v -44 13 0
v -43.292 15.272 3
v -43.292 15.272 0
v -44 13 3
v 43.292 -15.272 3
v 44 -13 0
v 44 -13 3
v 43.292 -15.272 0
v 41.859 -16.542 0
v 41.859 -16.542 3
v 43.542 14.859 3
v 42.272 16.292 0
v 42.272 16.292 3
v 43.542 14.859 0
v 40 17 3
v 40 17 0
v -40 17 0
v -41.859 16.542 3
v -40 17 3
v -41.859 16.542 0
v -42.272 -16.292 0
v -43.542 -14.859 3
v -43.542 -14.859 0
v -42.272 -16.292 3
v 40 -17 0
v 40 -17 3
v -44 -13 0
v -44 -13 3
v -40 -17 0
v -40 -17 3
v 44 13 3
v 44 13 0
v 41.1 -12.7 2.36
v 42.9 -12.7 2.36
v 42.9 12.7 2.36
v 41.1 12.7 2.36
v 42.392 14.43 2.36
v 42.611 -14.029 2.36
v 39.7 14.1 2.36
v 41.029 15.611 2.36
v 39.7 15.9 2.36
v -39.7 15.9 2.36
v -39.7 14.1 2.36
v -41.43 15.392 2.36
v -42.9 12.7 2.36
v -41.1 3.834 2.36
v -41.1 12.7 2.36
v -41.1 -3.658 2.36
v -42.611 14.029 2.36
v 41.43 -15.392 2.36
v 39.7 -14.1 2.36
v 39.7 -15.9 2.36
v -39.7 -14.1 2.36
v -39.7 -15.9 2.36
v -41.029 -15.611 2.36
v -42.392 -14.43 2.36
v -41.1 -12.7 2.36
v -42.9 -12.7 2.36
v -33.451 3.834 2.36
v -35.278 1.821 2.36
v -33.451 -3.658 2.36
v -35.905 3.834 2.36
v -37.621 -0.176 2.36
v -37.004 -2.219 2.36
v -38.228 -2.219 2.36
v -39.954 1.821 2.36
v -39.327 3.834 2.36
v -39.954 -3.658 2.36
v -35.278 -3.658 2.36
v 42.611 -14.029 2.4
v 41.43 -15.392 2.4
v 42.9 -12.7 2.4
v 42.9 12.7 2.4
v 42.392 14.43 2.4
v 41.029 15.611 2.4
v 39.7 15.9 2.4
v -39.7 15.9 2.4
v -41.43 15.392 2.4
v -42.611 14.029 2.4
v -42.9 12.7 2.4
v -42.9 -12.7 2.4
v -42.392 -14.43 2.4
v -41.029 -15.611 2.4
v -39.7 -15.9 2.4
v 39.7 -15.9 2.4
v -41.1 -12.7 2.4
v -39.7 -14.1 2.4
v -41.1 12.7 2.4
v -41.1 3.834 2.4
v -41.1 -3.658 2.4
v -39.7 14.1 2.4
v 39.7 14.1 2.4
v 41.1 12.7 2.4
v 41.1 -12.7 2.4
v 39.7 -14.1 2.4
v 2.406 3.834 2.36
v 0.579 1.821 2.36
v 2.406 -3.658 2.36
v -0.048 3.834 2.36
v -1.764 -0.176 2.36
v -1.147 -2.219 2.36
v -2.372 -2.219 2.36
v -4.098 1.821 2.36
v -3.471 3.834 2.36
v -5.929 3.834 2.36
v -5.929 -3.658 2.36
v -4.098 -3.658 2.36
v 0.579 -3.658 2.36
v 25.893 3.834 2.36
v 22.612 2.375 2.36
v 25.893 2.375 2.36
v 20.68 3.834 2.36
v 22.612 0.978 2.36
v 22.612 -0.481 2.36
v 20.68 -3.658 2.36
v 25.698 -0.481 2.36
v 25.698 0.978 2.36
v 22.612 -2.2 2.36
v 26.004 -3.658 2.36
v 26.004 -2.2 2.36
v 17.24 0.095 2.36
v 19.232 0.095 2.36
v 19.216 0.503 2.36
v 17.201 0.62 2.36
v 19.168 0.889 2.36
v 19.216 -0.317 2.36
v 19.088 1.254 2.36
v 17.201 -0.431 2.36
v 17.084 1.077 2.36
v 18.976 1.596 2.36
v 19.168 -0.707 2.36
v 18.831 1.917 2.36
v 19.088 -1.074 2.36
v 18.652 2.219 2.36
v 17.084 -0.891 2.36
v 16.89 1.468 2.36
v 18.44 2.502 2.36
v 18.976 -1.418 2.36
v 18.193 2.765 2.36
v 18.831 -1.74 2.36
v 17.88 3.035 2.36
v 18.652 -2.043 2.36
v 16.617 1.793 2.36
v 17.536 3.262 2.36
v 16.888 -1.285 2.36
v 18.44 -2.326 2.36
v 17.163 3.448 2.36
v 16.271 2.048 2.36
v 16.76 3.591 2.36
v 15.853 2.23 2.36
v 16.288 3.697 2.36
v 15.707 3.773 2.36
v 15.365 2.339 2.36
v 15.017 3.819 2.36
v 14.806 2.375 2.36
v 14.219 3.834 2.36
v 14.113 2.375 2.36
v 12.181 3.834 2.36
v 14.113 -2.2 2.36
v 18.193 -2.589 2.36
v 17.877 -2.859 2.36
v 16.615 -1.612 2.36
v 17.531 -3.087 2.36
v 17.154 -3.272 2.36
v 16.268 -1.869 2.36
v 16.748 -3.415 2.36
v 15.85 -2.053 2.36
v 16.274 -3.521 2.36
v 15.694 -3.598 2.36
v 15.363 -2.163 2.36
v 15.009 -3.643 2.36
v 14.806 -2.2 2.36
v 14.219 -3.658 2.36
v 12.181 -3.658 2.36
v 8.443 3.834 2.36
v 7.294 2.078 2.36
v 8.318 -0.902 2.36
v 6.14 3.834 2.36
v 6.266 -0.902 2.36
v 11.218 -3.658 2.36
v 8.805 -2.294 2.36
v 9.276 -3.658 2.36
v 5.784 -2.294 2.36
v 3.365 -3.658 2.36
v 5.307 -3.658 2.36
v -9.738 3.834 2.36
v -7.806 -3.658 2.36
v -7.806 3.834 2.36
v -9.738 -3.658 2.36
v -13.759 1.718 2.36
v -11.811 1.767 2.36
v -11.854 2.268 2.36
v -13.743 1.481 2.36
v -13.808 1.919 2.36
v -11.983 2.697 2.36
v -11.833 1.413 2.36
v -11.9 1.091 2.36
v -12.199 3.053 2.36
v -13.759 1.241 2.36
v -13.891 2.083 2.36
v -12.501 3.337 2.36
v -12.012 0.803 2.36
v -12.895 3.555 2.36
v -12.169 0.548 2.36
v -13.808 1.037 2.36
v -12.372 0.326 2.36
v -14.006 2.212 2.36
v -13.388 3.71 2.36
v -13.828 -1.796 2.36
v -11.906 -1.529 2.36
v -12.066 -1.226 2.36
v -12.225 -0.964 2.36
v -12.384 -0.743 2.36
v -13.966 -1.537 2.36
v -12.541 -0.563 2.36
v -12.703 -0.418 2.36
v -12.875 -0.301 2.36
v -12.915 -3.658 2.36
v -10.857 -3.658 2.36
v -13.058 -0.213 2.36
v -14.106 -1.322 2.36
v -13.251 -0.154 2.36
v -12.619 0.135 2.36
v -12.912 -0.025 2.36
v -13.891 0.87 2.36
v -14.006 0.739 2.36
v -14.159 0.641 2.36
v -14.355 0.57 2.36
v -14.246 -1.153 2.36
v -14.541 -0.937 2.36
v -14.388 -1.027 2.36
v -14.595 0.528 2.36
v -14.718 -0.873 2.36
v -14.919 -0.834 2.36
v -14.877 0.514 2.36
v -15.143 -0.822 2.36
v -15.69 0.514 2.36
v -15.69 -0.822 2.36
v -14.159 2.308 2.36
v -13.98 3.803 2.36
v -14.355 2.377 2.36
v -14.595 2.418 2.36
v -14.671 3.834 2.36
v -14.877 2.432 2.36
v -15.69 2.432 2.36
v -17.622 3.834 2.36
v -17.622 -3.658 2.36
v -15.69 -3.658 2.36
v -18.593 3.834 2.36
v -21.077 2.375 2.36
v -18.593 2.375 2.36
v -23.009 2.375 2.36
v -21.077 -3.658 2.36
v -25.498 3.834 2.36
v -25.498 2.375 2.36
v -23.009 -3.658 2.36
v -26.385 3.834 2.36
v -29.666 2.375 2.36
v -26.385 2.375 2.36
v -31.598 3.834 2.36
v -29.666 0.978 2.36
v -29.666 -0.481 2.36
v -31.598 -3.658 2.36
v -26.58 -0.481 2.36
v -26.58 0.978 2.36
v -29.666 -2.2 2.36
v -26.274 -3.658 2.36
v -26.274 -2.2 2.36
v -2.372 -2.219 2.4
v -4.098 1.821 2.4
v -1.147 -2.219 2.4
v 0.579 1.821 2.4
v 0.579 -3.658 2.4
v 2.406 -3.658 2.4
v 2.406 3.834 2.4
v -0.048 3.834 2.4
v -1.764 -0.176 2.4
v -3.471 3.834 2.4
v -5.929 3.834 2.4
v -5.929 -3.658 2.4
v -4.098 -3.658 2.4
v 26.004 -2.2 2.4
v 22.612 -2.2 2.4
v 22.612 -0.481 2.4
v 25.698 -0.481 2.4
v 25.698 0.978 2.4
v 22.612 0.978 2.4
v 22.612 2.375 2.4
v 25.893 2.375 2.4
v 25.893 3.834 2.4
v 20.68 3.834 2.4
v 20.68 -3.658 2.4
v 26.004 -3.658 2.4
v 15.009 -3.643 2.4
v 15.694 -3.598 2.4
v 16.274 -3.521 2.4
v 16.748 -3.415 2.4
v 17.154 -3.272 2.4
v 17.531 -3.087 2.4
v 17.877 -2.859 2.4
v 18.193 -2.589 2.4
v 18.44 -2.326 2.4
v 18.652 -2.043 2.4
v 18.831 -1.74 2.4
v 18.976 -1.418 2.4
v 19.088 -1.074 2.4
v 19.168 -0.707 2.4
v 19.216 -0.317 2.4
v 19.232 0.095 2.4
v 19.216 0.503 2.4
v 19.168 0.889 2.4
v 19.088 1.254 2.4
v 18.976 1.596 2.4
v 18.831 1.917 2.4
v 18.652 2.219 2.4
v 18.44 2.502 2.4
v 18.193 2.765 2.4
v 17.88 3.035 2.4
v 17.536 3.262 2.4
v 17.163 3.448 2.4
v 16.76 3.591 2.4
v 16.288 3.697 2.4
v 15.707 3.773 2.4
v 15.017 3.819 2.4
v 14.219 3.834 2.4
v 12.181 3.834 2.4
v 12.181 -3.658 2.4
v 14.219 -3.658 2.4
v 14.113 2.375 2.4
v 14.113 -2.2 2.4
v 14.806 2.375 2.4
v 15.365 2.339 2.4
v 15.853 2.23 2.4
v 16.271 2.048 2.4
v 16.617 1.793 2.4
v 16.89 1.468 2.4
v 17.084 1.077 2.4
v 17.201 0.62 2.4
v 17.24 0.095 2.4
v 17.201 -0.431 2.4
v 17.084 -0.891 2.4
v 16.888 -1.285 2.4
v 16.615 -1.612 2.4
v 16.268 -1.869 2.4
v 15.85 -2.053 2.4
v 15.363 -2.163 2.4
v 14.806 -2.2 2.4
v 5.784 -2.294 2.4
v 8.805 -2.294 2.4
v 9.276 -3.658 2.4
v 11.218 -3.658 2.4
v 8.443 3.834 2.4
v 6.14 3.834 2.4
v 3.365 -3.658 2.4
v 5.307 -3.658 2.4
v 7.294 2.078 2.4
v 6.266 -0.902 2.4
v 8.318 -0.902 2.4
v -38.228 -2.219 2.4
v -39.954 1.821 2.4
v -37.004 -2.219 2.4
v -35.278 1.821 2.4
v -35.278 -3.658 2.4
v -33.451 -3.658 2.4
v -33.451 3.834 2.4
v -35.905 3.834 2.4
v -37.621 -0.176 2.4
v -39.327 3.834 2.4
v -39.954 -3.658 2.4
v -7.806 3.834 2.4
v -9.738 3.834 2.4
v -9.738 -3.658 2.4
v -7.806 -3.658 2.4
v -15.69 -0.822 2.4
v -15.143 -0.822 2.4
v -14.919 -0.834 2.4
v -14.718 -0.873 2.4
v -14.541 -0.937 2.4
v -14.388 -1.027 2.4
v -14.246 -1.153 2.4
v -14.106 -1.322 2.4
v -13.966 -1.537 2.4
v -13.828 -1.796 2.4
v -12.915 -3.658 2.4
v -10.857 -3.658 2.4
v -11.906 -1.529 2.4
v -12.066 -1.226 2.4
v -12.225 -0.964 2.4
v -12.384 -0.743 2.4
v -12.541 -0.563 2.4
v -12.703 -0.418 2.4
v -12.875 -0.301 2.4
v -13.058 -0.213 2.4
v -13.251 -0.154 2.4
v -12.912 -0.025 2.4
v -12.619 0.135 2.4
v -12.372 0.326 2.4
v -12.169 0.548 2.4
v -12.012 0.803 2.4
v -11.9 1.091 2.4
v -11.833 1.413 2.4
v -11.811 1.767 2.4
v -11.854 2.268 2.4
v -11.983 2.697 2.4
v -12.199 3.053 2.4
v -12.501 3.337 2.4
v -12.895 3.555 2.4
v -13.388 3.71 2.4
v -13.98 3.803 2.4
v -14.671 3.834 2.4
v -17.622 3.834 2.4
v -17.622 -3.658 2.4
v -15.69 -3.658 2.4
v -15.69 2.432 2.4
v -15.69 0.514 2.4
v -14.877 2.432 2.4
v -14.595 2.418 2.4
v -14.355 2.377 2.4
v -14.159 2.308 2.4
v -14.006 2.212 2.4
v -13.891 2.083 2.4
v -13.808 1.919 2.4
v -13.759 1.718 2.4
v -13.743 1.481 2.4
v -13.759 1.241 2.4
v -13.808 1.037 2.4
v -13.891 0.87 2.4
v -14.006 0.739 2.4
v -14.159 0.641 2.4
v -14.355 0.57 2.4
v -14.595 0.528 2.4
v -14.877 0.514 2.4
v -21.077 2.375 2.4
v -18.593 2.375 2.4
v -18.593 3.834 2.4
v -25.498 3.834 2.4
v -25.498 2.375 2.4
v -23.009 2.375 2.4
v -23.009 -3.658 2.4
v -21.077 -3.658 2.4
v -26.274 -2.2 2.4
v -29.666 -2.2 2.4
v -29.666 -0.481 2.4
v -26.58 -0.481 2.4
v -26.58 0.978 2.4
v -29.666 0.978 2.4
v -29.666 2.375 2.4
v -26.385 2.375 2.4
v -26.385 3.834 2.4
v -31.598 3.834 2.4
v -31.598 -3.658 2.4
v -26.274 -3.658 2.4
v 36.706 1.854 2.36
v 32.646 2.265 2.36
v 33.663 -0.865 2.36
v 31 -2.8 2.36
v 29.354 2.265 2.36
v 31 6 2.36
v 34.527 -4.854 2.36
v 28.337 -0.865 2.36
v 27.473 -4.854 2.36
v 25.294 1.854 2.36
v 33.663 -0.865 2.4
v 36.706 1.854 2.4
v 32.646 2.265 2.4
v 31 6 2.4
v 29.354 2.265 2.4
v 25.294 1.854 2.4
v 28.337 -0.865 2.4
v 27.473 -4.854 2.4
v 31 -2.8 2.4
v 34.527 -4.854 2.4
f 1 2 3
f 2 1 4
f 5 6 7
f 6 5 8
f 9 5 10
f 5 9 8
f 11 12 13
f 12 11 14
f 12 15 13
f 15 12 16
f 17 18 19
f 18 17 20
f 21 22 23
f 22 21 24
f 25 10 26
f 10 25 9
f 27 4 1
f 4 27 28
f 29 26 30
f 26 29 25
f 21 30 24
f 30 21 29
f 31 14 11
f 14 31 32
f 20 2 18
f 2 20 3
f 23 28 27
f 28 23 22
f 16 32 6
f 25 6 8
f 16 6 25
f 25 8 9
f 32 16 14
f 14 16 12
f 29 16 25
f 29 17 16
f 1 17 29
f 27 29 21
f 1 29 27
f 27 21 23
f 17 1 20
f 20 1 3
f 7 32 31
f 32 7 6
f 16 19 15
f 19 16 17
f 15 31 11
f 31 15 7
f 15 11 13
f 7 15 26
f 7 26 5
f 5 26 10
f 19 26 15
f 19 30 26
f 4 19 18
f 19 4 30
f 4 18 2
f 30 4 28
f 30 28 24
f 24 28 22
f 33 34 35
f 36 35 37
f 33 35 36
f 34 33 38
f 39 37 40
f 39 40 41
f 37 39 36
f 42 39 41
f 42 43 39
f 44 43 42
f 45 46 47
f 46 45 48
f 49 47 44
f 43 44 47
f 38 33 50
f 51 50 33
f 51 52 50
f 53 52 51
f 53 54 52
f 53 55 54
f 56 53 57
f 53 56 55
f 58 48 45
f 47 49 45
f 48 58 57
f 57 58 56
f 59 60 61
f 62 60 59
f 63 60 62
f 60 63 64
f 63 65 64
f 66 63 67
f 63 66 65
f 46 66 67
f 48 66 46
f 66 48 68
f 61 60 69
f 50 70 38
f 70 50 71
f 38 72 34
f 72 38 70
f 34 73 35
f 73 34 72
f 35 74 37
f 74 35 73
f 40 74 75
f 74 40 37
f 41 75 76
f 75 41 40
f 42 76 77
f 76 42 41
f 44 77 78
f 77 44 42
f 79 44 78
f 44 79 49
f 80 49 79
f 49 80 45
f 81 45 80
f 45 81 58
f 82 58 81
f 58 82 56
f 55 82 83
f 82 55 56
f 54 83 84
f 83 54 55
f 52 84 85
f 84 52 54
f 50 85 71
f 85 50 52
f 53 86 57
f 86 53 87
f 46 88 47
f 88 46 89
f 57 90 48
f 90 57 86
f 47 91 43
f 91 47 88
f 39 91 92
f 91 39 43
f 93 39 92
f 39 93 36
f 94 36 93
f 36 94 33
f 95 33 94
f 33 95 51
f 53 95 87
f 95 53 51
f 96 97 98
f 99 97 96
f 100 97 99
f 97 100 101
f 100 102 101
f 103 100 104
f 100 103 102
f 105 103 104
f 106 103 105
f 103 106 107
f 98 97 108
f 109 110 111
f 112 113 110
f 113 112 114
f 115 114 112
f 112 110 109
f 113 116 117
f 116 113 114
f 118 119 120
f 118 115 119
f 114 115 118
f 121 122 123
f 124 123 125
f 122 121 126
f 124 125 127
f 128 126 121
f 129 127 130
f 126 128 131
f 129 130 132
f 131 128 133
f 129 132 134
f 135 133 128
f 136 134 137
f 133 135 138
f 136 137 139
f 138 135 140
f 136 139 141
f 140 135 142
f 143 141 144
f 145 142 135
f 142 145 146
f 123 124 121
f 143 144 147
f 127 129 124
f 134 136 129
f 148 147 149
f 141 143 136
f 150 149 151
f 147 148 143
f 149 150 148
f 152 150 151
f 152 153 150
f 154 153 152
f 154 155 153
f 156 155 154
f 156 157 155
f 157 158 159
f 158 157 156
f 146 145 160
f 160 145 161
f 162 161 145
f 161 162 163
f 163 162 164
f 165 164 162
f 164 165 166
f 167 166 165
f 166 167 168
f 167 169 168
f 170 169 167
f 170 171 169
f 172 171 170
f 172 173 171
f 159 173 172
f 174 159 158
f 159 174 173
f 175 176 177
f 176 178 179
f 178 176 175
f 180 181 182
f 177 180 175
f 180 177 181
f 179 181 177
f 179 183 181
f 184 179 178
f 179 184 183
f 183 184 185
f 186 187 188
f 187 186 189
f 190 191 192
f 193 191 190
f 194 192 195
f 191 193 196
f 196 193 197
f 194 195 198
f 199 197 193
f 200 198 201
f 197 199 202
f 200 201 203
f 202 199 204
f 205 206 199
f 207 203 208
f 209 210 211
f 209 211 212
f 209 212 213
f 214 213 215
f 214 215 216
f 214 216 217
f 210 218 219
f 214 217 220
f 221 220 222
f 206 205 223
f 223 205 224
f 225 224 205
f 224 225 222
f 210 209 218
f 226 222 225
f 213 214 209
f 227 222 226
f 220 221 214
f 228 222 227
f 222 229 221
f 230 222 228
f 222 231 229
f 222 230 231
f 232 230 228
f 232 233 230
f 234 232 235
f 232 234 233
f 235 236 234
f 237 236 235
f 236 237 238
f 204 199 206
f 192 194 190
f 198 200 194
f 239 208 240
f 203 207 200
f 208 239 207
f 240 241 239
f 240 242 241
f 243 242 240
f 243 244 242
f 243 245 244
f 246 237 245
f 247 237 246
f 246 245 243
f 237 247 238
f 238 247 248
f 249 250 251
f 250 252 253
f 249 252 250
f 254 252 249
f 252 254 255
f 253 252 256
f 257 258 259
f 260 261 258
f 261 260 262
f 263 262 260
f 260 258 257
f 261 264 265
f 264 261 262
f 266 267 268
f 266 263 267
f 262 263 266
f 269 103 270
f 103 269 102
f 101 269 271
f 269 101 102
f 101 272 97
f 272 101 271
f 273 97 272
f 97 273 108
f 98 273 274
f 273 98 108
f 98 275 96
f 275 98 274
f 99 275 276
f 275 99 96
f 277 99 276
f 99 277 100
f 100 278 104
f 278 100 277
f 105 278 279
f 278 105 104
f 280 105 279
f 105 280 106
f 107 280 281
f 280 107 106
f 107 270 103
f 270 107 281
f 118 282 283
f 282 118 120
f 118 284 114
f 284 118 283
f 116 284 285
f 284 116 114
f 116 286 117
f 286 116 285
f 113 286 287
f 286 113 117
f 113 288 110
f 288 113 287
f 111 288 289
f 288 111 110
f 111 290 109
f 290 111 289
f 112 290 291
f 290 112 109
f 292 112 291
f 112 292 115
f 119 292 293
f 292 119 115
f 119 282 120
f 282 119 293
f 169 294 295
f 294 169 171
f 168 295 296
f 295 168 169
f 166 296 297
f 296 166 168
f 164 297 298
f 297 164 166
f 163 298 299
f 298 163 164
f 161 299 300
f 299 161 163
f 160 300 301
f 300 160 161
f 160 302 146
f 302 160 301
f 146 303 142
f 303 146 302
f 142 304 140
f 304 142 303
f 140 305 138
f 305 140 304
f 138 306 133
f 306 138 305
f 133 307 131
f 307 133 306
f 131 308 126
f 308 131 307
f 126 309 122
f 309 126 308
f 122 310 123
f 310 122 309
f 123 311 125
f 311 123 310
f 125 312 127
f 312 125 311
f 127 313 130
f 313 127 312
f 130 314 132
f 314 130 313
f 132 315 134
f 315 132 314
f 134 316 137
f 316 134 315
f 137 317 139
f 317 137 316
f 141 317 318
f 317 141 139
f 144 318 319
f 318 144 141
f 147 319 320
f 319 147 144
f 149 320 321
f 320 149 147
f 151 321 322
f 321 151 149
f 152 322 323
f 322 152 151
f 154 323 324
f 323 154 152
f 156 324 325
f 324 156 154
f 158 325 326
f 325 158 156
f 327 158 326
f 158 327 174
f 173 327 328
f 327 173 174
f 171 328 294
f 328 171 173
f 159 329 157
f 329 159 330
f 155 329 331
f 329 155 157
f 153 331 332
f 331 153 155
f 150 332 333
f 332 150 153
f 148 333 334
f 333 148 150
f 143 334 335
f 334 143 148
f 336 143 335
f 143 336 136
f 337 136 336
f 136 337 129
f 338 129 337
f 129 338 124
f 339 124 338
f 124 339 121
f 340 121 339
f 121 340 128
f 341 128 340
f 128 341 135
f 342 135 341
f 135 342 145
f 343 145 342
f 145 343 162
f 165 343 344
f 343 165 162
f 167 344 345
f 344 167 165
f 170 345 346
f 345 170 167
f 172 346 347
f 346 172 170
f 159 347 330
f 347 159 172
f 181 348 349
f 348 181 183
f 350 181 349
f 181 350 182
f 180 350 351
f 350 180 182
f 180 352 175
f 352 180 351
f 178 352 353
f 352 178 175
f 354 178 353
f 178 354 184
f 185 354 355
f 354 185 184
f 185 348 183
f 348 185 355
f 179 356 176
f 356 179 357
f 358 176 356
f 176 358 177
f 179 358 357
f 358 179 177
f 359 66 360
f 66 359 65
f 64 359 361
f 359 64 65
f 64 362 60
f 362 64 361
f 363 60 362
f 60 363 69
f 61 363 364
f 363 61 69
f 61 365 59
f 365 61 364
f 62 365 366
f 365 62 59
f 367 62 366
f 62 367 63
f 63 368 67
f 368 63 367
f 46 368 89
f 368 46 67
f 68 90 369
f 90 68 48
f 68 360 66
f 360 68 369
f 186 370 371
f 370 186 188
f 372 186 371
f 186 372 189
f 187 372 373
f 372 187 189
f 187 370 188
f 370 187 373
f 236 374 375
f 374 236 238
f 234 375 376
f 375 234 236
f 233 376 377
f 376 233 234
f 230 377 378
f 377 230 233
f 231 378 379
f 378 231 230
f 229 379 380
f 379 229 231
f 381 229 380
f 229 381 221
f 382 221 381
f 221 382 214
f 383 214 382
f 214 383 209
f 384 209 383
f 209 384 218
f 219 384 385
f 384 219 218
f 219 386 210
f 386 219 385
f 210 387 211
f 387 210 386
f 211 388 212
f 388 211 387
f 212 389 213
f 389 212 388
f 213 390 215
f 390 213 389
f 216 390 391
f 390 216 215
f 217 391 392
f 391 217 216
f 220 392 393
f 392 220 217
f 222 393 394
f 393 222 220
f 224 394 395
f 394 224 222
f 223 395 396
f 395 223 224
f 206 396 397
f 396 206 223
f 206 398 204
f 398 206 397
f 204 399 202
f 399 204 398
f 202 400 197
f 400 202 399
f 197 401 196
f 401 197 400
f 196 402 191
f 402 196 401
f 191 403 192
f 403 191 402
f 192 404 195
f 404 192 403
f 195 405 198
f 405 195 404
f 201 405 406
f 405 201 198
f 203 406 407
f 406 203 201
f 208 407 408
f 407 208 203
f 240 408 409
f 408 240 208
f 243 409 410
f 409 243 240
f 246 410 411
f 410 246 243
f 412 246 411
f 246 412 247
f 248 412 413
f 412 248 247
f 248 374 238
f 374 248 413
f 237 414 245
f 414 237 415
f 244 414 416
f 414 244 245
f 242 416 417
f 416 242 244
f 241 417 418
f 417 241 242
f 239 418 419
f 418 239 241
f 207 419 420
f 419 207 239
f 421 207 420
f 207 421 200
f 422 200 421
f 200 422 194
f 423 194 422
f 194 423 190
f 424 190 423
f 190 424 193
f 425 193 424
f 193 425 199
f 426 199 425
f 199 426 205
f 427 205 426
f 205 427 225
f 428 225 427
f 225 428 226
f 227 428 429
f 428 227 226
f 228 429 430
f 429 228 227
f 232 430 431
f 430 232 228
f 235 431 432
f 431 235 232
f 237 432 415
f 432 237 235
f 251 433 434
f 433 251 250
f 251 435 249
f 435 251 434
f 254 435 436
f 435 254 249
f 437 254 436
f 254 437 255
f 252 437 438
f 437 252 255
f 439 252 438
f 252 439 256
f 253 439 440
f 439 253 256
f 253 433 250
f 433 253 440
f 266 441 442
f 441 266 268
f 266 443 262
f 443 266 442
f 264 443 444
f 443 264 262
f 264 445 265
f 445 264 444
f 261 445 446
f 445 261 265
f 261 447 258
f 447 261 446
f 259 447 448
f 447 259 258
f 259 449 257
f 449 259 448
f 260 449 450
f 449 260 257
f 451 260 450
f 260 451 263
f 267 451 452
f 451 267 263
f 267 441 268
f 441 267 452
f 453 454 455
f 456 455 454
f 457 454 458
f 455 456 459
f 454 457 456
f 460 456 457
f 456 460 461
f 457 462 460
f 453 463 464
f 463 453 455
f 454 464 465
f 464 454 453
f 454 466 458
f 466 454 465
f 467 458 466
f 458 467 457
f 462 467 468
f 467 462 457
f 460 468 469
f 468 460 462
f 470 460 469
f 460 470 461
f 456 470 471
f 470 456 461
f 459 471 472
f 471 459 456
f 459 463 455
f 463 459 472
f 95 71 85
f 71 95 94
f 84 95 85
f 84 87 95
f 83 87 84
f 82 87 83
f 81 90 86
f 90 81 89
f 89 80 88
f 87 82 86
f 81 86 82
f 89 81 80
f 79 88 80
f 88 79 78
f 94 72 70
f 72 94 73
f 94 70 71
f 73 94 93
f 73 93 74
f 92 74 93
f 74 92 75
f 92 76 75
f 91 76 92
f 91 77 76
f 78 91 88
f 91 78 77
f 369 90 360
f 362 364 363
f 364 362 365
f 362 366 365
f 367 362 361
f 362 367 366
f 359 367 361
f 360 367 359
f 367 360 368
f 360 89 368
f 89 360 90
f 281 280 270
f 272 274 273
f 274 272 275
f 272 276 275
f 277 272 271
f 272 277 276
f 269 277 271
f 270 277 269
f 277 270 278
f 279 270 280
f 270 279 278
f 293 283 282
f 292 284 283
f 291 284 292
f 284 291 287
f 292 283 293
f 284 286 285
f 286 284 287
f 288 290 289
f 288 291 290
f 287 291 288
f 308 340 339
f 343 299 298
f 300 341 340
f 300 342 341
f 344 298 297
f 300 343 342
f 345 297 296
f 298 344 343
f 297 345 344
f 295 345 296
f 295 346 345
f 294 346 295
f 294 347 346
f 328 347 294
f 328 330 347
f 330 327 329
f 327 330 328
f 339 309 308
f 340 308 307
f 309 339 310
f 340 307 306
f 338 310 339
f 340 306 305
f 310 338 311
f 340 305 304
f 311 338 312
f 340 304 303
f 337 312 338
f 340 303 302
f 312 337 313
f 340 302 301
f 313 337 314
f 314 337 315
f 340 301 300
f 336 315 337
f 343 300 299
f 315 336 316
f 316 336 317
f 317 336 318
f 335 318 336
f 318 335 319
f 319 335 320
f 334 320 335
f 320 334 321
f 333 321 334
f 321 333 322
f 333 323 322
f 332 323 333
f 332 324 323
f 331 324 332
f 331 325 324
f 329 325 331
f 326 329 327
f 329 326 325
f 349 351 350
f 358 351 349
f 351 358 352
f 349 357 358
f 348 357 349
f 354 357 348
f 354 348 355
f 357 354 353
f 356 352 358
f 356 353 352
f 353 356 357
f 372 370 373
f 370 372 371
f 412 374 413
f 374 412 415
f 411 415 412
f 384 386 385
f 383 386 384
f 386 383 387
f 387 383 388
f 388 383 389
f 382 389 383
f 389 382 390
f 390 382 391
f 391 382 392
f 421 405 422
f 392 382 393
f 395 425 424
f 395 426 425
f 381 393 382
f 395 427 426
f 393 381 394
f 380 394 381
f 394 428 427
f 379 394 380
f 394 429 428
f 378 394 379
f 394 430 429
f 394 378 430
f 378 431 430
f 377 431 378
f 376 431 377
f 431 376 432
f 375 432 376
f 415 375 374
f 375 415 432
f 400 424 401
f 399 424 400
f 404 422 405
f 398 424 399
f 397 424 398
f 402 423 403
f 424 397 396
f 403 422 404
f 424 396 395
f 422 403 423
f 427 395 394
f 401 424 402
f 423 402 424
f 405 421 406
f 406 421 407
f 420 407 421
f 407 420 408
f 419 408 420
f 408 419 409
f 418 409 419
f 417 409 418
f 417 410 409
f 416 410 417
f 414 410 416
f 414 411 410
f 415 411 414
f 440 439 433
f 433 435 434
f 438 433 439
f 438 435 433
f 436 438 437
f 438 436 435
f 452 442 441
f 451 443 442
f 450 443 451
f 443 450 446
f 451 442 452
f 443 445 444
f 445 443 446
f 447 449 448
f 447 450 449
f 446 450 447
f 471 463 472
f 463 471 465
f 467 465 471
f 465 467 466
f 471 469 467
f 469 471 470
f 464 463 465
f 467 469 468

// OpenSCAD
// Four-color parametric nameplate. Export with -D 'part="base"' etc.
part = "all";
label_text = "METRIMADE";
plate_w = 88;
plate_h = 34;
plate_t = 3.0;
corner_r = 4;
inlay_depth = 0.6;
border_w = 1.8;
eps = 0.04;

module rounded_rect_2d(w, h, r) {
    offset(r=r) square([w-2*r, h-2*r], center=true);
}

module plate_2d() { rounded_rect_2d(plate_w, plate_h, corner_r); }

module border_2d() {
    difference() {
        rounded_rect_2d(plate_w-2.2, plate_h-2.2, corner_r-0.8);
        rounded_rect_2d(plate_w-2.2-2*border_w, plate_h-2.2-2*border_w, max(corner_r-0.8-border_w, 0.8));
    }
}

module text_2d() {
    translate([-8, 0]) text(label_text, size=7.4, halign="center", valign="center", font="DejaVu Sans:style=Bold", spacing=1.02);
}

module star_2d(r1=6.0, r2=2.8, n=5) {
    polygon(points=[for (i=[0:2*n-1]) let(r=(i%2==0?r1:r2), a=90+i*180/n) [r*cos(a), r*sin(a)]]);
}
module icon_2d() { translate([31,0]) star_2d(); }

module accent_volume(profile="border", cutter=false) {
    z0 = plate_t - inlay_depth - (cutter ? eps : 0);
    hh = inlay_depth + (cutter ? 2*eps : 0);
    translate([0,0,z0]) linear_extrude(height=hh) {
        if (profile=="border") border_2d();
        if (profile=="text") text_2d();
        if (profile=="icon") icon_2d();
    }
}

module base() {
    difference() {
        linear_extrude(height=plate_t) plate_2d();
        accent_volume("border", true);
        accent_volume("text", true);
        accent_volume("icon", true);
    }
}
module border() { accent_volume("border", false); }
module lettering() { accent_volume("text", false); }
module icon() { accent_volume("icon", false); }

if (part=="base") base();
else if (part=="border") border();
else if (part=="lettering") lettering();
else if (part=="icon") icon();
else {
    color("#25282B") base();
    color("#27B9D3") border();
    color("#F2F0E8") lettering();
    color("#F26A21") icon();
}
